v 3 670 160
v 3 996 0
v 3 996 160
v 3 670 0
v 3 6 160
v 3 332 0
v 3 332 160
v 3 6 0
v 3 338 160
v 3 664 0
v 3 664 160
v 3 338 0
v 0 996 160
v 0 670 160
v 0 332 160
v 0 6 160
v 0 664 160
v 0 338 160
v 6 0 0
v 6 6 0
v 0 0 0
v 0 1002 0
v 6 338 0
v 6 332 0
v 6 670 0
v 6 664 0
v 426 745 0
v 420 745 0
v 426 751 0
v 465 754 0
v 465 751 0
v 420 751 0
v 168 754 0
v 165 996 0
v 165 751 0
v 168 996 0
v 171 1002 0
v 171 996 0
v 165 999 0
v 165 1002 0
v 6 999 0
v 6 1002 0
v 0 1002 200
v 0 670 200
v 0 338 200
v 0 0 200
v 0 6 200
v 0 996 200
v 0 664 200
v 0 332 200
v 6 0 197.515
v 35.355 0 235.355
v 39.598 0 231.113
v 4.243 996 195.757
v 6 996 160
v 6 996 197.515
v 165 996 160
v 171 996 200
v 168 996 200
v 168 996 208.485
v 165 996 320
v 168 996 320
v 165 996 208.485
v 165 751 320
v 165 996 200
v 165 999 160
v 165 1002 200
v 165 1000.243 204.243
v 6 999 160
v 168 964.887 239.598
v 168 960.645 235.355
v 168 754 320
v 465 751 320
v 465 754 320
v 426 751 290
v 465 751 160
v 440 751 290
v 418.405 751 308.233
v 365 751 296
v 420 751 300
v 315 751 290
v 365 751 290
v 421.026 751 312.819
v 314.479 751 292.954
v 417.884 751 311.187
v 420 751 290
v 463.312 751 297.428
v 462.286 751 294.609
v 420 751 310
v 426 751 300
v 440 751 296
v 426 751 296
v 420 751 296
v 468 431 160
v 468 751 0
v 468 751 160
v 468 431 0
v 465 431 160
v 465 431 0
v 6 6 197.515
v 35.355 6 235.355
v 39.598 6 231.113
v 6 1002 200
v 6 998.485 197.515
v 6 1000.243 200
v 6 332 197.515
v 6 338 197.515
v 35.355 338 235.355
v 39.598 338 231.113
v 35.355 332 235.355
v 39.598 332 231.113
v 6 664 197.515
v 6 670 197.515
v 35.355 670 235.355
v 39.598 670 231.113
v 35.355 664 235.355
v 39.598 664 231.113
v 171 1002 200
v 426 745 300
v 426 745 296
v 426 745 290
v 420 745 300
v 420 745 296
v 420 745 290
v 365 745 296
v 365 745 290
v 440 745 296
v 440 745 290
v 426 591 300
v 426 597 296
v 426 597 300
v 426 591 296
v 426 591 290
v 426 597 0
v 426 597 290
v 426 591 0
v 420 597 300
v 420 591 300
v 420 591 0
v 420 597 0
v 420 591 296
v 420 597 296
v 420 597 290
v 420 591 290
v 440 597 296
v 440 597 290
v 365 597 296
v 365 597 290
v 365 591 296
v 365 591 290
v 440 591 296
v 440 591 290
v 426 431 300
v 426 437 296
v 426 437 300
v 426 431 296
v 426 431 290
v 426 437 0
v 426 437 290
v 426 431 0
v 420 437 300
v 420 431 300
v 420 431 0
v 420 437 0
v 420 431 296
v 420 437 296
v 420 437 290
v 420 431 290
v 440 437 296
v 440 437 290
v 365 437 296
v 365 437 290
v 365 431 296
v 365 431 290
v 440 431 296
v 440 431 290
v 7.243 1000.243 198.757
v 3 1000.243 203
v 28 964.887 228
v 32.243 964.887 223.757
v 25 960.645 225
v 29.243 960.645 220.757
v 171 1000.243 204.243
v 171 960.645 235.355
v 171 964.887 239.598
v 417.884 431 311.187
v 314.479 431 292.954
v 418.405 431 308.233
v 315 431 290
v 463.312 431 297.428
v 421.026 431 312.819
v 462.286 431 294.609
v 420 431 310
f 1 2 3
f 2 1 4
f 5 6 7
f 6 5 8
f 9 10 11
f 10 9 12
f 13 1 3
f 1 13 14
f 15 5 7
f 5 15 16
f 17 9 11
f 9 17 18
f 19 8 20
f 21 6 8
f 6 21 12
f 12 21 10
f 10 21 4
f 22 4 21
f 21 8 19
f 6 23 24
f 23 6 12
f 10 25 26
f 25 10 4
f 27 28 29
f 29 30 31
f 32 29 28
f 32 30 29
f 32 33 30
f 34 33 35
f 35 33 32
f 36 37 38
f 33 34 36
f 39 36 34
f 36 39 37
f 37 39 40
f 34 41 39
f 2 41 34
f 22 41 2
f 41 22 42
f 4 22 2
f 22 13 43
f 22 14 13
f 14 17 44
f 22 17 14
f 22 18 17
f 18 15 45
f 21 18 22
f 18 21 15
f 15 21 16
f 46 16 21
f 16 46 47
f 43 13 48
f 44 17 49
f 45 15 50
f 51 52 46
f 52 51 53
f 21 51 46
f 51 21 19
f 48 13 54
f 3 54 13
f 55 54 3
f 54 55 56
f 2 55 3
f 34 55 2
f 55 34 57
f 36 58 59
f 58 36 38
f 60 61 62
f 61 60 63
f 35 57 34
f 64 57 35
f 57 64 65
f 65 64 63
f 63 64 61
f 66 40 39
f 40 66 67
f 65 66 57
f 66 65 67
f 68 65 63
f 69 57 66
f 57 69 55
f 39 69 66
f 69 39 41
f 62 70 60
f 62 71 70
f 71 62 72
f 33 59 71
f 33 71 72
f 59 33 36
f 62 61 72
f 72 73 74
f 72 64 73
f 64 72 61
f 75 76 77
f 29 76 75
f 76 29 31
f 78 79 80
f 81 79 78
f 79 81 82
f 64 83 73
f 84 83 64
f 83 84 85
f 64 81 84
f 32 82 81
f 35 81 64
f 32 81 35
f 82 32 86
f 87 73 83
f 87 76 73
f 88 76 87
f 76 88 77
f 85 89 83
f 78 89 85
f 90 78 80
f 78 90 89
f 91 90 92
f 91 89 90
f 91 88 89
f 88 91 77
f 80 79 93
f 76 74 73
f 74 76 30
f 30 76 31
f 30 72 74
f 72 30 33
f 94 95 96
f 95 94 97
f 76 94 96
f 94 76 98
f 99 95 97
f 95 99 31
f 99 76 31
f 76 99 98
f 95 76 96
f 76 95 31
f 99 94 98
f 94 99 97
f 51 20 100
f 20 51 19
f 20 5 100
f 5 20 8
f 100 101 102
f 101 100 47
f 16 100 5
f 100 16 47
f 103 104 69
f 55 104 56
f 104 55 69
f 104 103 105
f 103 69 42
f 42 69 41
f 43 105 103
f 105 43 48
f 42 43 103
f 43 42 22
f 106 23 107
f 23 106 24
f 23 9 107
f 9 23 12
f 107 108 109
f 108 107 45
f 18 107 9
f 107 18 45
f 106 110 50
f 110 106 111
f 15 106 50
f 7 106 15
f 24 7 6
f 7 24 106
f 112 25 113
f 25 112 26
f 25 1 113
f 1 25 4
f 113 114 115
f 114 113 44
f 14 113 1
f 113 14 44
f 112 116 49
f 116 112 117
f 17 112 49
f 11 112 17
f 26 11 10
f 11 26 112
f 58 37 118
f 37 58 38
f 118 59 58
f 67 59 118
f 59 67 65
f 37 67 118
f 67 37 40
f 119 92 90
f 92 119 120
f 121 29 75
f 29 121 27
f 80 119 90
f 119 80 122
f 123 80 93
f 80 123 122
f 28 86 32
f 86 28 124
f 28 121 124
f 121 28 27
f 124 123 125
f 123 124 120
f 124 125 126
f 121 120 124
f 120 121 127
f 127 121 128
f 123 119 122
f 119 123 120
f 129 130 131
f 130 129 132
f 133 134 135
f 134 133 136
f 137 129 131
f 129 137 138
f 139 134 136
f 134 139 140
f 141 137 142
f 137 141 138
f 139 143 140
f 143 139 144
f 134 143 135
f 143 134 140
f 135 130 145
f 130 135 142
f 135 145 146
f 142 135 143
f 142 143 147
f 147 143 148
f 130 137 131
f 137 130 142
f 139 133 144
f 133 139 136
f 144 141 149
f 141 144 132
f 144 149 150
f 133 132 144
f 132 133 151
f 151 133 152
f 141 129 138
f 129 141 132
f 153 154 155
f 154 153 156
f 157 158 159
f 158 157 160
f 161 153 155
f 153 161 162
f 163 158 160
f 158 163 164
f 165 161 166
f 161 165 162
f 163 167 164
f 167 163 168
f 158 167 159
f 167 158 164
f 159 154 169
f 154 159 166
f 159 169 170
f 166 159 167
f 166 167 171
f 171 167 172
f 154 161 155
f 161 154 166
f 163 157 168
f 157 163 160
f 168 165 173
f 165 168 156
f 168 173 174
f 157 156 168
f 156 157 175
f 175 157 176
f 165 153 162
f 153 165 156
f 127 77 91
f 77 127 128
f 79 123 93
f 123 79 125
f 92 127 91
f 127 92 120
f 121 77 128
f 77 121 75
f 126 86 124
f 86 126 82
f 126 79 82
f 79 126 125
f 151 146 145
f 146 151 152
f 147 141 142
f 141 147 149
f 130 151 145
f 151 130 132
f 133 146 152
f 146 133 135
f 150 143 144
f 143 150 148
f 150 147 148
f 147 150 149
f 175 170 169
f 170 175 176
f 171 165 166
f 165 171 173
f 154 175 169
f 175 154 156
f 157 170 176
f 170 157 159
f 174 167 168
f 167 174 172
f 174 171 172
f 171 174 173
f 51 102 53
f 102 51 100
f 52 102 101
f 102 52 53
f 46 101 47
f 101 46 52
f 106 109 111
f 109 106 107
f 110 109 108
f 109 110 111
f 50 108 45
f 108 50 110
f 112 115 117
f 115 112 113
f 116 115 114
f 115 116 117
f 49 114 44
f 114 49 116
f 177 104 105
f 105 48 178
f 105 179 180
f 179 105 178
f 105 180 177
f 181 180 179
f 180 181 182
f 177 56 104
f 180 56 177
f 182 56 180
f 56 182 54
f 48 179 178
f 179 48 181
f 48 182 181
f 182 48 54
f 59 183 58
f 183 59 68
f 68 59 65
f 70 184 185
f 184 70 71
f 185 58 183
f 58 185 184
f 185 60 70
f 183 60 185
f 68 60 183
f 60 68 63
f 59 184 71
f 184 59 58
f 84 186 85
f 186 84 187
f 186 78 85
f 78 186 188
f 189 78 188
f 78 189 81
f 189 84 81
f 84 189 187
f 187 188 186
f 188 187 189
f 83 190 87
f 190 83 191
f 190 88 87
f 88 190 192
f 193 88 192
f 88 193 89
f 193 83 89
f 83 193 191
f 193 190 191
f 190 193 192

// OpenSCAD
lWallStone = 696;
lWallWood = 300;
backWall = 165;
lSideSchuur = 245;
frontSchuur = 300;
rWall = 320;
h = 160; //an arbitrarily selected height

/* structural */
color("blue"){cube([3,lWallStone,h]);}
translate([0,lWallStone,0]){
	cube([3,lWallWood,h]);}
translate([0,lWallStone+lWallWood,0]){
	cube([backWall,3,h]);}
translate([backWall,(lWallStone+lWallWood)-lSideSchuur,0]){
	cube([3,lSideSchuur,h*2]);}
translate([backWall,(lWallStone+lWallWood)-lSideSchuur,0]){
	cube([frontSchuur,3,h*2]);}
translate([backWall+frontSchuur,(lWallStone+lWallWood)-lSideSchuur-rWall,0]){
	cube([3,rWall,h]);}

/* posts */
hPost = 200;
widthBikes = 150; //TODO measure
hBikePost = 300; //TODO measure
wPlanter = 80; //TODO measure
translate([0,0,0]){
	color("purple"){cube([6,6,hPost]);}}
translate([0,lWallWood+lWallStone,0]){
	color("purple"){cube([6,6,hPost]);}}
translate([0,(lWallWood+lWallStone)/3,0]){
	color("purple"){cube([6,6,hPost]);}}
translate([0,2*(lWallWood+lWallStone)/3,0]){
	color("purple"){cube([6,6,hPost]);}}
translate([backWall,lWallWood+lWallStone,0]){
	color("purple"){cube([6,6,hPost]);}}
/*bike shelter posts*/
translate([backWall+frontSchuur-(.3*widthBikes),(lWallStone+lWallWood)-lSideSchuur-6,0]){
	color("purple"){cube([6,6,hBikePost]);}}
translate([backWall+frontSchuur-(.3*widthBikes),(lWallStone+lWallWood)-lSideSchuur-(rWall/2),0]){
	color("purple"){cube([6,6,hBikePost]);}}
translate([backWall+frontSchuur-(.3*widthBikes),(lWallStone+lWallWood)-lSideSchuur-rWall,0]){
	color("purple"){cube([6,6,hBikePost]);}}
/*horizontal supports*/
translate([backWall+frontSchuur-(widthBikes*2/3),(lWallStone+lWallWood)-lSideSchuur-6,hBikePost-10]){
	color("purple"){cube([widthBikes/2,6,6]);}}
translate([backWall+frontSchuur-(widthBikes*2/3),(lWallStone+lWallWood)-lSideSchuur-(rWall/2),hBikePost-10]){
	color("purple"){cube([widthBikes/2,6,6]);}}
translate([backWall+frontSchuur-(widthBikes*2/3),(lWallStone+lWallWood)-lSideSchuur-rWall,hBikePost-10]){
	color("purple"){cube([widthBikes/2,6,6]);}}

/* angled supports */
translate([0,0,hPost]){
	rotate([0,45,0]){
	color("purple"){cube([6,6,50]);}}}
translate([0,(lWallWood+lWallStone)/3,hPost]){
	rotate([0,45,0]){
	color("purple"){cube([6,6,50]);}}}
translate([0,2*(lWallWood+lWallStone)/3,hPost]){
	rotate([0,45,0]){
	color("purple"){cube([6,6,50]);}}}
translate([0,lWallWood+lWallStone,hPost]){
	rotate([45,45,0]){
	color("purple"){cube([6,6,50]);}}}
translate([backWall,lWallWood+lWallStone,hPost]){
	rotate([45,0,0]){
	color("purple"){cube([6,6,50]);}}}

/* roof bike area */
translate([backWall+frontSchuur-widthBikes,(lWallStone+lWallWood)-lSideSchuur-rWall,hBikePost-10]){
	rotate([0,-10,0]){
	color("blue"){cube([(.7*widthBikes),rWall,3]);}}}
translate([backWall+frontSchuur-(.3*widthBikes),(lWallStone+lWallWood)-lSideSchuur-rWall,hBikePost+10]){
	rotate([0,20,0]){
	color("blue"){cube([(.3*widthBikes),rWall,3]);}}}

/* BOM
3 x hBikePost
3 x (widthBikes/2)
5 x hPost
5 x 50 (angled supports)
1 x bike roof (clear plexiglass)
electric fencing: 
 echo(lWallStone + lWallWood + backWall + lSideSchuur + frontSchuur + rWall); //2026
 + 226 + (437 * 2) //outer edge of roof garden
 * 2  // at least two wires around the whole thing, maybe 3
 + 300  //some extra for going to ground
bits to hold the wire, power, ground, etc.
bike rack x 4 bikes
netting to discourage cat escape
*/
